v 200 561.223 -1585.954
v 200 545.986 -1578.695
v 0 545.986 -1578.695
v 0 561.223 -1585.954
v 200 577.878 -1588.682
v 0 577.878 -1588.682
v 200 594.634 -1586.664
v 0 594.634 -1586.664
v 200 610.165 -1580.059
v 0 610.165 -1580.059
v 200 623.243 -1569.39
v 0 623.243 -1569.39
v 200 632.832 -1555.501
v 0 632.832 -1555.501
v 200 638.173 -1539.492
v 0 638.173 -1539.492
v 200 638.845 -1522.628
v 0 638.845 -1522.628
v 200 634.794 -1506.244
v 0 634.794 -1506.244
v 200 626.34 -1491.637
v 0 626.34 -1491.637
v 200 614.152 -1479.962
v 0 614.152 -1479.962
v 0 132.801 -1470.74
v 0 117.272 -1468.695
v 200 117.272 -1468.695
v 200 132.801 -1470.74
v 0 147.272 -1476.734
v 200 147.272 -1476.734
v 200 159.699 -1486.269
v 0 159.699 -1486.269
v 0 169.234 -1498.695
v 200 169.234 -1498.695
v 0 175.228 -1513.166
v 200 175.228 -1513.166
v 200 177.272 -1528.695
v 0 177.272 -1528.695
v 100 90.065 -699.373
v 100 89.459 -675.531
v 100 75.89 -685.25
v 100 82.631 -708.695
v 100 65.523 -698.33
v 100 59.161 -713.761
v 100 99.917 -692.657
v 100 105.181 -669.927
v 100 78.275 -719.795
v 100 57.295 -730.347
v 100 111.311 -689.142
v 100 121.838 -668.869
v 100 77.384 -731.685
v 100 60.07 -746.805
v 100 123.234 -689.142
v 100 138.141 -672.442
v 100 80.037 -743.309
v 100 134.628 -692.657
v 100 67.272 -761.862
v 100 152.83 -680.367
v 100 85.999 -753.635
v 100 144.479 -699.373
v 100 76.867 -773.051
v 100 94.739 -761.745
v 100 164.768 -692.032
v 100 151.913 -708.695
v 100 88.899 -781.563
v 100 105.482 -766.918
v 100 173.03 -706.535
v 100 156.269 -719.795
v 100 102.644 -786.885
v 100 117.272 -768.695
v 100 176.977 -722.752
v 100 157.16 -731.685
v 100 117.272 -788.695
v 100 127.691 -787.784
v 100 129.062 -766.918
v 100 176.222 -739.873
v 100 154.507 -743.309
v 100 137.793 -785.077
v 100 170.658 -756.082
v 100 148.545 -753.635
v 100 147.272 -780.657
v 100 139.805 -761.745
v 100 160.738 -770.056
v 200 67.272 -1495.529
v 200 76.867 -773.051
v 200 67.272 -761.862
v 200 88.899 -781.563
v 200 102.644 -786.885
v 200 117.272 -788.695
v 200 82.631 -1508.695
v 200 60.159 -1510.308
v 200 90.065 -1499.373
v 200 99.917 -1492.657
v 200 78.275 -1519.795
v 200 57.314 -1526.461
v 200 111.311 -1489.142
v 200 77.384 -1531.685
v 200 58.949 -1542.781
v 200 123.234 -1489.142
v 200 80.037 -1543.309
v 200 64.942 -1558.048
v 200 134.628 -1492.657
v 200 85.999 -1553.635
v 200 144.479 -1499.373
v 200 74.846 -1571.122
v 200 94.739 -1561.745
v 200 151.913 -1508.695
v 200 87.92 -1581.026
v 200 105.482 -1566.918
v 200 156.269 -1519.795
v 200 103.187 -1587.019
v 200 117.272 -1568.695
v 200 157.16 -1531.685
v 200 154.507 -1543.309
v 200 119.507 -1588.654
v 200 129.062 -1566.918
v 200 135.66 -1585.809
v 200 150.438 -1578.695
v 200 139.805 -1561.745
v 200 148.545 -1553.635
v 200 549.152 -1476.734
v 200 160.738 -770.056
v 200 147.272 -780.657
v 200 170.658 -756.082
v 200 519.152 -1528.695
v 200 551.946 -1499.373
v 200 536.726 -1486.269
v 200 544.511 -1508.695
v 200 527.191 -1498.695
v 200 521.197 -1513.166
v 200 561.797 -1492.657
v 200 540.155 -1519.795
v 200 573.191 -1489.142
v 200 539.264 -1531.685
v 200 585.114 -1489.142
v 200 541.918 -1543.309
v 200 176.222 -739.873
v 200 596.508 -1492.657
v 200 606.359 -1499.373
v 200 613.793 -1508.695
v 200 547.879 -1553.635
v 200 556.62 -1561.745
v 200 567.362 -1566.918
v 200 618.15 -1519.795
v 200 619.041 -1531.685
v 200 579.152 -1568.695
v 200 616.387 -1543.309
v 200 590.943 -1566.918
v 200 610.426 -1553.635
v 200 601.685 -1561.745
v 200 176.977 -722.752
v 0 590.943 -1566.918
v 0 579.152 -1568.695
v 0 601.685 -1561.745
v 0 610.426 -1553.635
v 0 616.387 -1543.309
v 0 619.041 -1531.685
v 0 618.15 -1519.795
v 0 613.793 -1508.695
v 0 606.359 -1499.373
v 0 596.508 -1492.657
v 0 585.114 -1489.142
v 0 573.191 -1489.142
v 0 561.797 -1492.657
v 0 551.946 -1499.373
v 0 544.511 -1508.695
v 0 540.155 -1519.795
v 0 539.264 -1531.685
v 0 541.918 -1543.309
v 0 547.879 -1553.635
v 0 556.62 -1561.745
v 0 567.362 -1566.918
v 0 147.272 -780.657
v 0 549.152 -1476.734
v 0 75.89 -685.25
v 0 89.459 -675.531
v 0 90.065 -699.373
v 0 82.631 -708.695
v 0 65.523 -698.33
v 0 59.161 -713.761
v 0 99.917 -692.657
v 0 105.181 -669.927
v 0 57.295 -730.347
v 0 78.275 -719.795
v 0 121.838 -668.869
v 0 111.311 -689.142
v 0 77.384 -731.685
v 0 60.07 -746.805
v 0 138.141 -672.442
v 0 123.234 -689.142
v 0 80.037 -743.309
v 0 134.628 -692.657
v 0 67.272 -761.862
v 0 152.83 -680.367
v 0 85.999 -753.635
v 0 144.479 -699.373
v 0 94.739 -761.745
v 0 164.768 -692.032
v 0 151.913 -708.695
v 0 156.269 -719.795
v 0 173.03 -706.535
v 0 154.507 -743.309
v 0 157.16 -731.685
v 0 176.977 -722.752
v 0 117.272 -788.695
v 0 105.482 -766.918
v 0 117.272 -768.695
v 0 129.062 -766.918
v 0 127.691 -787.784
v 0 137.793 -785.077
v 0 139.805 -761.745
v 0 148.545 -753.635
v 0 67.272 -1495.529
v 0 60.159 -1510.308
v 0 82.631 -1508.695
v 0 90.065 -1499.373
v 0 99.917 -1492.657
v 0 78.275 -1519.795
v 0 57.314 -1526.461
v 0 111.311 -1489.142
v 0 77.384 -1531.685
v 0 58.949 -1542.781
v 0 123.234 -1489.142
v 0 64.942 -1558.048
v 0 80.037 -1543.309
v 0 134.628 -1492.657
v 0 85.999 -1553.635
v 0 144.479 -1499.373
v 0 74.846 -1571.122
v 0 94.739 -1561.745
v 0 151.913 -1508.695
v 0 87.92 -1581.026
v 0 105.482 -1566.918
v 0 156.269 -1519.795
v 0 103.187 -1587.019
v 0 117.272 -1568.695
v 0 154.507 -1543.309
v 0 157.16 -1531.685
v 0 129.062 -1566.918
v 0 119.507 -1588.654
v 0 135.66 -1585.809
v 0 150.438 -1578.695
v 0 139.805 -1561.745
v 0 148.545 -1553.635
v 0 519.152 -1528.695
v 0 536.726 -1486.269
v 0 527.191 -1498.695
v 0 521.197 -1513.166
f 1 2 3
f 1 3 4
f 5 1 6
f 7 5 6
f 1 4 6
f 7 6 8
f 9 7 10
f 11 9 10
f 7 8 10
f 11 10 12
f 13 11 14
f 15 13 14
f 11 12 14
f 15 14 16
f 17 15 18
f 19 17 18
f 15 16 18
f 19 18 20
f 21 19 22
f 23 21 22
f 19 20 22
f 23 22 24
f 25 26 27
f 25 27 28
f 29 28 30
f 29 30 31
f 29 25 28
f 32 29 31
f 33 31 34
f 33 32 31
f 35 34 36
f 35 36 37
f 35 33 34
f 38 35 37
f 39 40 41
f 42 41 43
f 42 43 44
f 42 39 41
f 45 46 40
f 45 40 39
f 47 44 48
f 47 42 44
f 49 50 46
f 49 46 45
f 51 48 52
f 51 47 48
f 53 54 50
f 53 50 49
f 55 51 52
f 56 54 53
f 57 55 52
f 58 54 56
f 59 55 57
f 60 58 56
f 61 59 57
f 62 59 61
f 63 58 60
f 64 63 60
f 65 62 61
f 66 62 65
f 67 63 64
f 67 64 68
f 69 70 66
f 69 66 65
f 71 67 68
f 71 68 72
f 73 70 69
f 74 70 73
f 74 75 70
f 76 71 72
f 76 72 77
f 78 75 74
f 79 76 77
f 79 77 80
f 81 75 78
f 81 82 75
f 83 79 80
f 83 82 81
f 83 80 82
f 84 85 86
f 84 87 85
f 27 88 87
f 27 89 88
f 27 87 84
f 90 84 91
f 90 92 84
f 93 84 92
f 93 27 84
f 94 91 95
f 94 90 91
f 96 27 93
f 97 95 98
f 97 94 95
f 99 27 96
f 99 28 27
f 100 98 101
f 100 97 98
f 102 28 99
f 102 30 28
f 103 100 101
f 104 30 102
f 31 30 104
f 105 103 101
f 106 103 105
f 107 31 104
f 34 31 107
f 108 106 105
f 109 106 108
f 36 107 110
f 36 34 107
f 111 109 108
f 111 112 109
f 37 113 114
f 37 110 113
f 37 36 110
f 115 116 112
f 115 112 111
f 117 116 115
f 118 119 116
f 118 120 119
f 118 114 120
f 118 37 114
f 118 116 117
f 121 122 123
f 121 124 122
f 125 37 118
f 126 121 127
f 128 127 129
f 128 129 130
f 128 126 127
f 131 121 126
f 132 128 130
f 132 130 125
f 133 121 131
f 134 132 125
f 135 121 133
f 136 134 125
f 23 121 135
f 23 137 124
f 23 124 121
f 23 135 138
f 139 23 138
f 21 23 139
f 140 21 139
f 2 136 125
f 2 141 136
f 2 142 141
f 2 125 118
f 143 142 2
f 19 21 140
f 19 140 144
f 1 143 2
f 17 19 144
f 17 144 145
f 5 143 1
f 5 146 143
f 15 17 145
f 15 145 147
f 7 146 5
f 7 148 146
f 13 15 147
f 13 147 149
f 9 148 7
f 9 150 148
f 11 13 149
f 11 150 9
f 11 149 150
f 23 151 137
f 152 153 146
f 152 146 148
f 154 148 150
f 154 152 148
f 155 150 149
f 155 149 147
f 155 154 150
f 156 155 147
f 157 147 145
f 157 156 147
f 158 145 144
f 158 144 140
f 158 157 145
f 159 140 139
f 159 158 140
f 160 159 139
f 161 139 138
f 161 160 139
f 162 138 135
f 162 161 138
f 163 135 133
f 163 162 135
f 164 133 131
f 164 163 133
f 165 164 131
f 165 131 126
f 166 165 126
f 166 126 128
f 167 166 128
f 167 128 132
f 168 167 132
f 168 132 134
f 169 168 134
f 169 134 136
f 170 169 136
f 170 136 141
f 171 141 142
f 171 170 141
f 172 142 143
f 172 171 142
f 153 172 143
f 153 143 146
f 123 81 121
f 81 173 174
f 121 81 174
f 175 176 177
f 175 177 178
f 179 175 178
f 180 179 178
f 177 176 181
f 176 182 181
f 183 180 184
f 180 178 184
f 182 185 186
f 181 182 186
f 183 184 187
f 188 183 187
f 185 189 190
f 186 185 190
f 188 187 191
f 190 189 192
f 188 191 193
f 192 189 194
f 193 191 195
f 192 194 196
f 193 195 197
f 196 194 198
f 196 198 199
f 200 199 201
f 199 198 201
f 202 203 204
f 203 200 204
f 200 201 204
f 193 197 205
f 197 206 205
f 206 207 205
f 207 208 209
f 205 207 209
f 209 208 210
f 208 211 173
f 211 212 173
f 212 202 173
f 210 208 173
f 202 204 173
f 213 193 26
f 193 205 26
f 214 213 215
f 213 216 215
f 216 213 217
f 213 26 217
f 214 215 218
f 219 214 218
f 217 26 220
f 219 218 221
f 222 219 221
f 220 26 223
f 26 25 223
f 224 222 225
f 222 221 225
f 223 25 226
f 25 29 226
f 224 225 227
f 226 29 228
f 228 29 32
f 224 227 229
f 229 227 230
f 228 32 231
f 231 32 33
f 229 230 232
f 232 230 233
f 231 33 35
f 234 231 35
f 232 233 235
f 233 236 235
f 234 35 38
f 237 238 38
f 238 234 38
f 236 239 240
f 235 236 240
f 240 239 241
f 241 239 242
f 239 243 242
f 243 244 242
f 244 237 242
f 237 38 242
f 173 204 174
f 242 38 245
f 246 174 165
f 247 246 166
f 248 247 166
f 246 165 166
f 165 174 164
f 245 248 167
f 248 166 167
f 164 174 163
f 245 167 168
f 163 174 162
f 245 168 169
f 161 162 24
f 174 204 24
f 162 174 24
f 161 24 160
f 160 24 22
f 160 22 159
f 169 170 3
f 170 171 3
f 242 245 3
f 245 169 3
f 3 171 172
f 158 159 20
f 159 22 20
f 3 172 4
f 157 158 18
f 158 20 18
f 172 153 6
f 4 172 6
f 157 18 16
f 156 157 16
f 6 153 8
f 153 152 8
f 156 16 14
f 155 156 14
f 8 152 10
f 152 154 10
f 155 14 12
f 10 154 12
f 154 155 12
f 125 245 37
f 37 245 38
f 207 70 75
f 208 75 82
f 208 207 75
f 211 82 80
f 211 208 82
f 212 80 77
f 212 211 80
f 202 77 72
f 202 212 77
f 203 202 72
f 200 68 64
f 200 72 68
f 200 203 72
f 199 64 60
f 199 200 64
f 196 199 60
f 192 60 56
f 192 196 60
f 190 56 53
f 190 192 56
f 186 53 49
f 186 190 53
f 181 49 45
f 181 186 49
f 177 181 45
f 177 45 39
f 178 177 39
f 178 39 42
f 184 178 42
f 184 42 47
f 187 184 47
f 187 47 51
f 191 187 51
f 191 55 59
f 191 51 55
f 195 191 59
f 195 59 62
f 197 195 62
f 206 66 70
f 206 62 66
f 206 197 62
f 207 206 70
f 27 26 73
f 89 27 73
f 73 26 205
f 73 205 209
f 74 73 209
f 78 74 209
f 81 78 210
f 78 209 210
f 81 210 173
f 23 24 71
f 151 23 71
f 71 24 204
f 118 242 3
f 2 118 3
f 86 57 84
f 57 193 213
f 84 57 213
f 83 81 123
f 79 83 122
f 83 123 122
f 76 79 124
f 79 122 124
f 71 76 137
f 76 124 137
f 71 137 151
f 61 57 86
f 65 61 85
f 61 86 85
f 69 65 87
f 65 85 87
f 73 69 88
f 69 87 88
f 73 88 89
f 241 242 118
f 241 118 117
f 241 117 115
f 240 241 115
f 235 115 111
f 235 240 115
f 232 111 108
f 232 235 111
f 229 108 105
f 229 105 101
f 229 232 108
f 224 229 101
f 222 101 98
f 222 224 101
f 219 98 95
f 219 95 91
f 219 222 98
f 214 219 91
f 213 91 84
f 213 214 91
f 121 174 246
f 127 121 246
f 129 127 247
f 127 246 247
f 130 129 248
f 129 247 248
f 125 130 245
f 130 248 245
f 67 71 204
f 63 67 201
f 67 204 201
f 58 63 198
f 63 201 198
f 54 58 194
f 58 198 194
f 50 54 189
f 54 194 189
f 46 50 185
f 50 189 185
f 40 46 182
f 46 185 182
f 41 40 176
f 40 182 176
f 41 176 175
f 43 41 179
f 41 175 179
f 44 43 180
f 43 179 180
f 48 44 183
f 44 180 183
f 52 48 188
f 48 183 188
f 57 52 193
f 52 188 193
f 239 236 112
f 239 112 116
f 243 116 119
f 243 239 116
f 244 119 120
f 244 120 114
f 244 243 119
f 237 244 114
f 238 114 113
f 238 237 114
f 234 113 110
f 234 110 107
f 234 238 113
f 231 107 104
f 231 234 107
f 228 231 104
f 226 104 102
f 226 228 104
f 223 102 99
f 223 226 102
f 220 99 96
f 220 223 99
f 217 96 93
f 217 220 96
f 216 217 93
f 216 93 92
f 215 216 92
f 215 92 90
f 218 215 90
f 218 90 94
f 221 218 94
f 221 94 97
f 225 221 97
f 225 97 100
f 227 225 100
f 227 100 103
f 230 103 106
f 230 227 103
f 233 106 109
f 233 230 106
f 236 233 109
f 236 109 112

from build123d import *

# Parameters (mm, degrees)
SKETCH2_R           = 40
BOSS_EXTRUDE1_DEPTH = 200
CUT_EXTRUDE1_START  = 200
SKETCH4_R           = 60
CUT_EXTRUDE1_DEPTH  = 100


with BuildPart() as part:
    # Sketch2 → Boss-Extrude1 (new body)
    with BuildSketch(Plane(origin=(0, 0, 0), x_dir=(0, 0, -1), z_dir=(1, 0, 0))):
        with BuildLine():
            ThreePointArc((1495.529247778, 67.272238992), (1475.827854944, 88.899495683), (1468.695495681, 117.272238992))
            Line((1468.695495681, 117.272238992), (788.695495681, 117.272238992))
            ThreePointArc((788.695495681, 117.272238992), (781.563136418, 88.899495683), (761.861743585, 67.272238992))
            Line((761.861743585, 67.272238992), (1495.529247778, 67.272238992))
        make_face()
        with BuildLine():
            Line((780.657019908, 147.272238992), (1476.733971454, 549.152454344))
            ThreePointArc((1476.733971454, 549.152454344), (1468.769326722, 582.128067523), (1479.961523957, 614.152454344))
            Line((1479.961523957, 614.152454344), (722.751592411, 176.977096532))
            ThreePointArc((722.751592411, 176.977096532), (756.081623557, 170.657630252), (780.657019908, 147.272238992))
        make_face()
        with BuildLine():
            ThreePointArc((1578.695495681, 545.98620644), (1557.068238991, 526.284813607), (1528.695495681, 519.152454344))
            Line((1528.695495681, 519.152454344), (1528.695495681, 177.272238992))
            ThreePointArc((1528.695495681, 177.272238992), (1557.068238991, 170.139879729), (1578.695495681, 150.438486896))
            Line((1578.695495681, 150.438486896), (1578.695495681, 545.98620644))
        make_face()
        with BuildLine():
            ThreePointArc((780.657019908, 147.272238992), (670.739946104, 101.743096286), (788.695495681, 117.272238992))
            ThreePointArc((788.695495681, 117.272238992), (786.651045259, 132.801381698), (780.657019908, 147.272238992))
        make_face()
        with Locations((728.695495681, 117.272238992)):
            Circle(SKETCH2_R, mode=Mode.SUBTRACT)
        with BuildLine():
            ThreePointArc((1468.695495681, 117.272238992), (1486.26908881, 159.698645863), (1528.695495681, 177.272238992))
            ThreePointArc((1528.695495681, 177.272238992), (1571.121902553, 74.845832121), (1468.695495681, 117.272238992))
        make_face()
        with Locations((1528.695495681, 117.272238992)):
            Circle(SKETCH2_R, mode=Mode.SUBTRACT)
        with BuildLine():
            ThreePointArc((1528.695495681, 519.152454344), (1558.695495681, 631.113978571), (1476.733971454, 549.152454344))
            ThreePointArc((1476.733971454, 549.152454344), (1498.695495681, 527.190930117), (1528.695495681, 519.152454344))
        make_face()
        with Locations((1528.695495681, 579.152454344)):
            Circle(SKETCH2_R, mode=Mode.SUBTRACT)
    extrude(amount=BOSS_EXTRUDE1_DEPTH)

    # Sketch4 → Cut-Extrude1 (cut)
    with BuildSketch(Plane(origin=(0, 0, 0), x_dir=(0, 0, -1), z_dir=(1, 0, 0)).offset(CUT_EXTRUDE1_START)):
        with Locations((728.695495681, 117.272238992)):
            Circle(SKETCH4_R)
    extrude(amount=-CUT_EXTRUDE1_DEPTH, mode=Mode.SUBTRACT)


solid = part.part
